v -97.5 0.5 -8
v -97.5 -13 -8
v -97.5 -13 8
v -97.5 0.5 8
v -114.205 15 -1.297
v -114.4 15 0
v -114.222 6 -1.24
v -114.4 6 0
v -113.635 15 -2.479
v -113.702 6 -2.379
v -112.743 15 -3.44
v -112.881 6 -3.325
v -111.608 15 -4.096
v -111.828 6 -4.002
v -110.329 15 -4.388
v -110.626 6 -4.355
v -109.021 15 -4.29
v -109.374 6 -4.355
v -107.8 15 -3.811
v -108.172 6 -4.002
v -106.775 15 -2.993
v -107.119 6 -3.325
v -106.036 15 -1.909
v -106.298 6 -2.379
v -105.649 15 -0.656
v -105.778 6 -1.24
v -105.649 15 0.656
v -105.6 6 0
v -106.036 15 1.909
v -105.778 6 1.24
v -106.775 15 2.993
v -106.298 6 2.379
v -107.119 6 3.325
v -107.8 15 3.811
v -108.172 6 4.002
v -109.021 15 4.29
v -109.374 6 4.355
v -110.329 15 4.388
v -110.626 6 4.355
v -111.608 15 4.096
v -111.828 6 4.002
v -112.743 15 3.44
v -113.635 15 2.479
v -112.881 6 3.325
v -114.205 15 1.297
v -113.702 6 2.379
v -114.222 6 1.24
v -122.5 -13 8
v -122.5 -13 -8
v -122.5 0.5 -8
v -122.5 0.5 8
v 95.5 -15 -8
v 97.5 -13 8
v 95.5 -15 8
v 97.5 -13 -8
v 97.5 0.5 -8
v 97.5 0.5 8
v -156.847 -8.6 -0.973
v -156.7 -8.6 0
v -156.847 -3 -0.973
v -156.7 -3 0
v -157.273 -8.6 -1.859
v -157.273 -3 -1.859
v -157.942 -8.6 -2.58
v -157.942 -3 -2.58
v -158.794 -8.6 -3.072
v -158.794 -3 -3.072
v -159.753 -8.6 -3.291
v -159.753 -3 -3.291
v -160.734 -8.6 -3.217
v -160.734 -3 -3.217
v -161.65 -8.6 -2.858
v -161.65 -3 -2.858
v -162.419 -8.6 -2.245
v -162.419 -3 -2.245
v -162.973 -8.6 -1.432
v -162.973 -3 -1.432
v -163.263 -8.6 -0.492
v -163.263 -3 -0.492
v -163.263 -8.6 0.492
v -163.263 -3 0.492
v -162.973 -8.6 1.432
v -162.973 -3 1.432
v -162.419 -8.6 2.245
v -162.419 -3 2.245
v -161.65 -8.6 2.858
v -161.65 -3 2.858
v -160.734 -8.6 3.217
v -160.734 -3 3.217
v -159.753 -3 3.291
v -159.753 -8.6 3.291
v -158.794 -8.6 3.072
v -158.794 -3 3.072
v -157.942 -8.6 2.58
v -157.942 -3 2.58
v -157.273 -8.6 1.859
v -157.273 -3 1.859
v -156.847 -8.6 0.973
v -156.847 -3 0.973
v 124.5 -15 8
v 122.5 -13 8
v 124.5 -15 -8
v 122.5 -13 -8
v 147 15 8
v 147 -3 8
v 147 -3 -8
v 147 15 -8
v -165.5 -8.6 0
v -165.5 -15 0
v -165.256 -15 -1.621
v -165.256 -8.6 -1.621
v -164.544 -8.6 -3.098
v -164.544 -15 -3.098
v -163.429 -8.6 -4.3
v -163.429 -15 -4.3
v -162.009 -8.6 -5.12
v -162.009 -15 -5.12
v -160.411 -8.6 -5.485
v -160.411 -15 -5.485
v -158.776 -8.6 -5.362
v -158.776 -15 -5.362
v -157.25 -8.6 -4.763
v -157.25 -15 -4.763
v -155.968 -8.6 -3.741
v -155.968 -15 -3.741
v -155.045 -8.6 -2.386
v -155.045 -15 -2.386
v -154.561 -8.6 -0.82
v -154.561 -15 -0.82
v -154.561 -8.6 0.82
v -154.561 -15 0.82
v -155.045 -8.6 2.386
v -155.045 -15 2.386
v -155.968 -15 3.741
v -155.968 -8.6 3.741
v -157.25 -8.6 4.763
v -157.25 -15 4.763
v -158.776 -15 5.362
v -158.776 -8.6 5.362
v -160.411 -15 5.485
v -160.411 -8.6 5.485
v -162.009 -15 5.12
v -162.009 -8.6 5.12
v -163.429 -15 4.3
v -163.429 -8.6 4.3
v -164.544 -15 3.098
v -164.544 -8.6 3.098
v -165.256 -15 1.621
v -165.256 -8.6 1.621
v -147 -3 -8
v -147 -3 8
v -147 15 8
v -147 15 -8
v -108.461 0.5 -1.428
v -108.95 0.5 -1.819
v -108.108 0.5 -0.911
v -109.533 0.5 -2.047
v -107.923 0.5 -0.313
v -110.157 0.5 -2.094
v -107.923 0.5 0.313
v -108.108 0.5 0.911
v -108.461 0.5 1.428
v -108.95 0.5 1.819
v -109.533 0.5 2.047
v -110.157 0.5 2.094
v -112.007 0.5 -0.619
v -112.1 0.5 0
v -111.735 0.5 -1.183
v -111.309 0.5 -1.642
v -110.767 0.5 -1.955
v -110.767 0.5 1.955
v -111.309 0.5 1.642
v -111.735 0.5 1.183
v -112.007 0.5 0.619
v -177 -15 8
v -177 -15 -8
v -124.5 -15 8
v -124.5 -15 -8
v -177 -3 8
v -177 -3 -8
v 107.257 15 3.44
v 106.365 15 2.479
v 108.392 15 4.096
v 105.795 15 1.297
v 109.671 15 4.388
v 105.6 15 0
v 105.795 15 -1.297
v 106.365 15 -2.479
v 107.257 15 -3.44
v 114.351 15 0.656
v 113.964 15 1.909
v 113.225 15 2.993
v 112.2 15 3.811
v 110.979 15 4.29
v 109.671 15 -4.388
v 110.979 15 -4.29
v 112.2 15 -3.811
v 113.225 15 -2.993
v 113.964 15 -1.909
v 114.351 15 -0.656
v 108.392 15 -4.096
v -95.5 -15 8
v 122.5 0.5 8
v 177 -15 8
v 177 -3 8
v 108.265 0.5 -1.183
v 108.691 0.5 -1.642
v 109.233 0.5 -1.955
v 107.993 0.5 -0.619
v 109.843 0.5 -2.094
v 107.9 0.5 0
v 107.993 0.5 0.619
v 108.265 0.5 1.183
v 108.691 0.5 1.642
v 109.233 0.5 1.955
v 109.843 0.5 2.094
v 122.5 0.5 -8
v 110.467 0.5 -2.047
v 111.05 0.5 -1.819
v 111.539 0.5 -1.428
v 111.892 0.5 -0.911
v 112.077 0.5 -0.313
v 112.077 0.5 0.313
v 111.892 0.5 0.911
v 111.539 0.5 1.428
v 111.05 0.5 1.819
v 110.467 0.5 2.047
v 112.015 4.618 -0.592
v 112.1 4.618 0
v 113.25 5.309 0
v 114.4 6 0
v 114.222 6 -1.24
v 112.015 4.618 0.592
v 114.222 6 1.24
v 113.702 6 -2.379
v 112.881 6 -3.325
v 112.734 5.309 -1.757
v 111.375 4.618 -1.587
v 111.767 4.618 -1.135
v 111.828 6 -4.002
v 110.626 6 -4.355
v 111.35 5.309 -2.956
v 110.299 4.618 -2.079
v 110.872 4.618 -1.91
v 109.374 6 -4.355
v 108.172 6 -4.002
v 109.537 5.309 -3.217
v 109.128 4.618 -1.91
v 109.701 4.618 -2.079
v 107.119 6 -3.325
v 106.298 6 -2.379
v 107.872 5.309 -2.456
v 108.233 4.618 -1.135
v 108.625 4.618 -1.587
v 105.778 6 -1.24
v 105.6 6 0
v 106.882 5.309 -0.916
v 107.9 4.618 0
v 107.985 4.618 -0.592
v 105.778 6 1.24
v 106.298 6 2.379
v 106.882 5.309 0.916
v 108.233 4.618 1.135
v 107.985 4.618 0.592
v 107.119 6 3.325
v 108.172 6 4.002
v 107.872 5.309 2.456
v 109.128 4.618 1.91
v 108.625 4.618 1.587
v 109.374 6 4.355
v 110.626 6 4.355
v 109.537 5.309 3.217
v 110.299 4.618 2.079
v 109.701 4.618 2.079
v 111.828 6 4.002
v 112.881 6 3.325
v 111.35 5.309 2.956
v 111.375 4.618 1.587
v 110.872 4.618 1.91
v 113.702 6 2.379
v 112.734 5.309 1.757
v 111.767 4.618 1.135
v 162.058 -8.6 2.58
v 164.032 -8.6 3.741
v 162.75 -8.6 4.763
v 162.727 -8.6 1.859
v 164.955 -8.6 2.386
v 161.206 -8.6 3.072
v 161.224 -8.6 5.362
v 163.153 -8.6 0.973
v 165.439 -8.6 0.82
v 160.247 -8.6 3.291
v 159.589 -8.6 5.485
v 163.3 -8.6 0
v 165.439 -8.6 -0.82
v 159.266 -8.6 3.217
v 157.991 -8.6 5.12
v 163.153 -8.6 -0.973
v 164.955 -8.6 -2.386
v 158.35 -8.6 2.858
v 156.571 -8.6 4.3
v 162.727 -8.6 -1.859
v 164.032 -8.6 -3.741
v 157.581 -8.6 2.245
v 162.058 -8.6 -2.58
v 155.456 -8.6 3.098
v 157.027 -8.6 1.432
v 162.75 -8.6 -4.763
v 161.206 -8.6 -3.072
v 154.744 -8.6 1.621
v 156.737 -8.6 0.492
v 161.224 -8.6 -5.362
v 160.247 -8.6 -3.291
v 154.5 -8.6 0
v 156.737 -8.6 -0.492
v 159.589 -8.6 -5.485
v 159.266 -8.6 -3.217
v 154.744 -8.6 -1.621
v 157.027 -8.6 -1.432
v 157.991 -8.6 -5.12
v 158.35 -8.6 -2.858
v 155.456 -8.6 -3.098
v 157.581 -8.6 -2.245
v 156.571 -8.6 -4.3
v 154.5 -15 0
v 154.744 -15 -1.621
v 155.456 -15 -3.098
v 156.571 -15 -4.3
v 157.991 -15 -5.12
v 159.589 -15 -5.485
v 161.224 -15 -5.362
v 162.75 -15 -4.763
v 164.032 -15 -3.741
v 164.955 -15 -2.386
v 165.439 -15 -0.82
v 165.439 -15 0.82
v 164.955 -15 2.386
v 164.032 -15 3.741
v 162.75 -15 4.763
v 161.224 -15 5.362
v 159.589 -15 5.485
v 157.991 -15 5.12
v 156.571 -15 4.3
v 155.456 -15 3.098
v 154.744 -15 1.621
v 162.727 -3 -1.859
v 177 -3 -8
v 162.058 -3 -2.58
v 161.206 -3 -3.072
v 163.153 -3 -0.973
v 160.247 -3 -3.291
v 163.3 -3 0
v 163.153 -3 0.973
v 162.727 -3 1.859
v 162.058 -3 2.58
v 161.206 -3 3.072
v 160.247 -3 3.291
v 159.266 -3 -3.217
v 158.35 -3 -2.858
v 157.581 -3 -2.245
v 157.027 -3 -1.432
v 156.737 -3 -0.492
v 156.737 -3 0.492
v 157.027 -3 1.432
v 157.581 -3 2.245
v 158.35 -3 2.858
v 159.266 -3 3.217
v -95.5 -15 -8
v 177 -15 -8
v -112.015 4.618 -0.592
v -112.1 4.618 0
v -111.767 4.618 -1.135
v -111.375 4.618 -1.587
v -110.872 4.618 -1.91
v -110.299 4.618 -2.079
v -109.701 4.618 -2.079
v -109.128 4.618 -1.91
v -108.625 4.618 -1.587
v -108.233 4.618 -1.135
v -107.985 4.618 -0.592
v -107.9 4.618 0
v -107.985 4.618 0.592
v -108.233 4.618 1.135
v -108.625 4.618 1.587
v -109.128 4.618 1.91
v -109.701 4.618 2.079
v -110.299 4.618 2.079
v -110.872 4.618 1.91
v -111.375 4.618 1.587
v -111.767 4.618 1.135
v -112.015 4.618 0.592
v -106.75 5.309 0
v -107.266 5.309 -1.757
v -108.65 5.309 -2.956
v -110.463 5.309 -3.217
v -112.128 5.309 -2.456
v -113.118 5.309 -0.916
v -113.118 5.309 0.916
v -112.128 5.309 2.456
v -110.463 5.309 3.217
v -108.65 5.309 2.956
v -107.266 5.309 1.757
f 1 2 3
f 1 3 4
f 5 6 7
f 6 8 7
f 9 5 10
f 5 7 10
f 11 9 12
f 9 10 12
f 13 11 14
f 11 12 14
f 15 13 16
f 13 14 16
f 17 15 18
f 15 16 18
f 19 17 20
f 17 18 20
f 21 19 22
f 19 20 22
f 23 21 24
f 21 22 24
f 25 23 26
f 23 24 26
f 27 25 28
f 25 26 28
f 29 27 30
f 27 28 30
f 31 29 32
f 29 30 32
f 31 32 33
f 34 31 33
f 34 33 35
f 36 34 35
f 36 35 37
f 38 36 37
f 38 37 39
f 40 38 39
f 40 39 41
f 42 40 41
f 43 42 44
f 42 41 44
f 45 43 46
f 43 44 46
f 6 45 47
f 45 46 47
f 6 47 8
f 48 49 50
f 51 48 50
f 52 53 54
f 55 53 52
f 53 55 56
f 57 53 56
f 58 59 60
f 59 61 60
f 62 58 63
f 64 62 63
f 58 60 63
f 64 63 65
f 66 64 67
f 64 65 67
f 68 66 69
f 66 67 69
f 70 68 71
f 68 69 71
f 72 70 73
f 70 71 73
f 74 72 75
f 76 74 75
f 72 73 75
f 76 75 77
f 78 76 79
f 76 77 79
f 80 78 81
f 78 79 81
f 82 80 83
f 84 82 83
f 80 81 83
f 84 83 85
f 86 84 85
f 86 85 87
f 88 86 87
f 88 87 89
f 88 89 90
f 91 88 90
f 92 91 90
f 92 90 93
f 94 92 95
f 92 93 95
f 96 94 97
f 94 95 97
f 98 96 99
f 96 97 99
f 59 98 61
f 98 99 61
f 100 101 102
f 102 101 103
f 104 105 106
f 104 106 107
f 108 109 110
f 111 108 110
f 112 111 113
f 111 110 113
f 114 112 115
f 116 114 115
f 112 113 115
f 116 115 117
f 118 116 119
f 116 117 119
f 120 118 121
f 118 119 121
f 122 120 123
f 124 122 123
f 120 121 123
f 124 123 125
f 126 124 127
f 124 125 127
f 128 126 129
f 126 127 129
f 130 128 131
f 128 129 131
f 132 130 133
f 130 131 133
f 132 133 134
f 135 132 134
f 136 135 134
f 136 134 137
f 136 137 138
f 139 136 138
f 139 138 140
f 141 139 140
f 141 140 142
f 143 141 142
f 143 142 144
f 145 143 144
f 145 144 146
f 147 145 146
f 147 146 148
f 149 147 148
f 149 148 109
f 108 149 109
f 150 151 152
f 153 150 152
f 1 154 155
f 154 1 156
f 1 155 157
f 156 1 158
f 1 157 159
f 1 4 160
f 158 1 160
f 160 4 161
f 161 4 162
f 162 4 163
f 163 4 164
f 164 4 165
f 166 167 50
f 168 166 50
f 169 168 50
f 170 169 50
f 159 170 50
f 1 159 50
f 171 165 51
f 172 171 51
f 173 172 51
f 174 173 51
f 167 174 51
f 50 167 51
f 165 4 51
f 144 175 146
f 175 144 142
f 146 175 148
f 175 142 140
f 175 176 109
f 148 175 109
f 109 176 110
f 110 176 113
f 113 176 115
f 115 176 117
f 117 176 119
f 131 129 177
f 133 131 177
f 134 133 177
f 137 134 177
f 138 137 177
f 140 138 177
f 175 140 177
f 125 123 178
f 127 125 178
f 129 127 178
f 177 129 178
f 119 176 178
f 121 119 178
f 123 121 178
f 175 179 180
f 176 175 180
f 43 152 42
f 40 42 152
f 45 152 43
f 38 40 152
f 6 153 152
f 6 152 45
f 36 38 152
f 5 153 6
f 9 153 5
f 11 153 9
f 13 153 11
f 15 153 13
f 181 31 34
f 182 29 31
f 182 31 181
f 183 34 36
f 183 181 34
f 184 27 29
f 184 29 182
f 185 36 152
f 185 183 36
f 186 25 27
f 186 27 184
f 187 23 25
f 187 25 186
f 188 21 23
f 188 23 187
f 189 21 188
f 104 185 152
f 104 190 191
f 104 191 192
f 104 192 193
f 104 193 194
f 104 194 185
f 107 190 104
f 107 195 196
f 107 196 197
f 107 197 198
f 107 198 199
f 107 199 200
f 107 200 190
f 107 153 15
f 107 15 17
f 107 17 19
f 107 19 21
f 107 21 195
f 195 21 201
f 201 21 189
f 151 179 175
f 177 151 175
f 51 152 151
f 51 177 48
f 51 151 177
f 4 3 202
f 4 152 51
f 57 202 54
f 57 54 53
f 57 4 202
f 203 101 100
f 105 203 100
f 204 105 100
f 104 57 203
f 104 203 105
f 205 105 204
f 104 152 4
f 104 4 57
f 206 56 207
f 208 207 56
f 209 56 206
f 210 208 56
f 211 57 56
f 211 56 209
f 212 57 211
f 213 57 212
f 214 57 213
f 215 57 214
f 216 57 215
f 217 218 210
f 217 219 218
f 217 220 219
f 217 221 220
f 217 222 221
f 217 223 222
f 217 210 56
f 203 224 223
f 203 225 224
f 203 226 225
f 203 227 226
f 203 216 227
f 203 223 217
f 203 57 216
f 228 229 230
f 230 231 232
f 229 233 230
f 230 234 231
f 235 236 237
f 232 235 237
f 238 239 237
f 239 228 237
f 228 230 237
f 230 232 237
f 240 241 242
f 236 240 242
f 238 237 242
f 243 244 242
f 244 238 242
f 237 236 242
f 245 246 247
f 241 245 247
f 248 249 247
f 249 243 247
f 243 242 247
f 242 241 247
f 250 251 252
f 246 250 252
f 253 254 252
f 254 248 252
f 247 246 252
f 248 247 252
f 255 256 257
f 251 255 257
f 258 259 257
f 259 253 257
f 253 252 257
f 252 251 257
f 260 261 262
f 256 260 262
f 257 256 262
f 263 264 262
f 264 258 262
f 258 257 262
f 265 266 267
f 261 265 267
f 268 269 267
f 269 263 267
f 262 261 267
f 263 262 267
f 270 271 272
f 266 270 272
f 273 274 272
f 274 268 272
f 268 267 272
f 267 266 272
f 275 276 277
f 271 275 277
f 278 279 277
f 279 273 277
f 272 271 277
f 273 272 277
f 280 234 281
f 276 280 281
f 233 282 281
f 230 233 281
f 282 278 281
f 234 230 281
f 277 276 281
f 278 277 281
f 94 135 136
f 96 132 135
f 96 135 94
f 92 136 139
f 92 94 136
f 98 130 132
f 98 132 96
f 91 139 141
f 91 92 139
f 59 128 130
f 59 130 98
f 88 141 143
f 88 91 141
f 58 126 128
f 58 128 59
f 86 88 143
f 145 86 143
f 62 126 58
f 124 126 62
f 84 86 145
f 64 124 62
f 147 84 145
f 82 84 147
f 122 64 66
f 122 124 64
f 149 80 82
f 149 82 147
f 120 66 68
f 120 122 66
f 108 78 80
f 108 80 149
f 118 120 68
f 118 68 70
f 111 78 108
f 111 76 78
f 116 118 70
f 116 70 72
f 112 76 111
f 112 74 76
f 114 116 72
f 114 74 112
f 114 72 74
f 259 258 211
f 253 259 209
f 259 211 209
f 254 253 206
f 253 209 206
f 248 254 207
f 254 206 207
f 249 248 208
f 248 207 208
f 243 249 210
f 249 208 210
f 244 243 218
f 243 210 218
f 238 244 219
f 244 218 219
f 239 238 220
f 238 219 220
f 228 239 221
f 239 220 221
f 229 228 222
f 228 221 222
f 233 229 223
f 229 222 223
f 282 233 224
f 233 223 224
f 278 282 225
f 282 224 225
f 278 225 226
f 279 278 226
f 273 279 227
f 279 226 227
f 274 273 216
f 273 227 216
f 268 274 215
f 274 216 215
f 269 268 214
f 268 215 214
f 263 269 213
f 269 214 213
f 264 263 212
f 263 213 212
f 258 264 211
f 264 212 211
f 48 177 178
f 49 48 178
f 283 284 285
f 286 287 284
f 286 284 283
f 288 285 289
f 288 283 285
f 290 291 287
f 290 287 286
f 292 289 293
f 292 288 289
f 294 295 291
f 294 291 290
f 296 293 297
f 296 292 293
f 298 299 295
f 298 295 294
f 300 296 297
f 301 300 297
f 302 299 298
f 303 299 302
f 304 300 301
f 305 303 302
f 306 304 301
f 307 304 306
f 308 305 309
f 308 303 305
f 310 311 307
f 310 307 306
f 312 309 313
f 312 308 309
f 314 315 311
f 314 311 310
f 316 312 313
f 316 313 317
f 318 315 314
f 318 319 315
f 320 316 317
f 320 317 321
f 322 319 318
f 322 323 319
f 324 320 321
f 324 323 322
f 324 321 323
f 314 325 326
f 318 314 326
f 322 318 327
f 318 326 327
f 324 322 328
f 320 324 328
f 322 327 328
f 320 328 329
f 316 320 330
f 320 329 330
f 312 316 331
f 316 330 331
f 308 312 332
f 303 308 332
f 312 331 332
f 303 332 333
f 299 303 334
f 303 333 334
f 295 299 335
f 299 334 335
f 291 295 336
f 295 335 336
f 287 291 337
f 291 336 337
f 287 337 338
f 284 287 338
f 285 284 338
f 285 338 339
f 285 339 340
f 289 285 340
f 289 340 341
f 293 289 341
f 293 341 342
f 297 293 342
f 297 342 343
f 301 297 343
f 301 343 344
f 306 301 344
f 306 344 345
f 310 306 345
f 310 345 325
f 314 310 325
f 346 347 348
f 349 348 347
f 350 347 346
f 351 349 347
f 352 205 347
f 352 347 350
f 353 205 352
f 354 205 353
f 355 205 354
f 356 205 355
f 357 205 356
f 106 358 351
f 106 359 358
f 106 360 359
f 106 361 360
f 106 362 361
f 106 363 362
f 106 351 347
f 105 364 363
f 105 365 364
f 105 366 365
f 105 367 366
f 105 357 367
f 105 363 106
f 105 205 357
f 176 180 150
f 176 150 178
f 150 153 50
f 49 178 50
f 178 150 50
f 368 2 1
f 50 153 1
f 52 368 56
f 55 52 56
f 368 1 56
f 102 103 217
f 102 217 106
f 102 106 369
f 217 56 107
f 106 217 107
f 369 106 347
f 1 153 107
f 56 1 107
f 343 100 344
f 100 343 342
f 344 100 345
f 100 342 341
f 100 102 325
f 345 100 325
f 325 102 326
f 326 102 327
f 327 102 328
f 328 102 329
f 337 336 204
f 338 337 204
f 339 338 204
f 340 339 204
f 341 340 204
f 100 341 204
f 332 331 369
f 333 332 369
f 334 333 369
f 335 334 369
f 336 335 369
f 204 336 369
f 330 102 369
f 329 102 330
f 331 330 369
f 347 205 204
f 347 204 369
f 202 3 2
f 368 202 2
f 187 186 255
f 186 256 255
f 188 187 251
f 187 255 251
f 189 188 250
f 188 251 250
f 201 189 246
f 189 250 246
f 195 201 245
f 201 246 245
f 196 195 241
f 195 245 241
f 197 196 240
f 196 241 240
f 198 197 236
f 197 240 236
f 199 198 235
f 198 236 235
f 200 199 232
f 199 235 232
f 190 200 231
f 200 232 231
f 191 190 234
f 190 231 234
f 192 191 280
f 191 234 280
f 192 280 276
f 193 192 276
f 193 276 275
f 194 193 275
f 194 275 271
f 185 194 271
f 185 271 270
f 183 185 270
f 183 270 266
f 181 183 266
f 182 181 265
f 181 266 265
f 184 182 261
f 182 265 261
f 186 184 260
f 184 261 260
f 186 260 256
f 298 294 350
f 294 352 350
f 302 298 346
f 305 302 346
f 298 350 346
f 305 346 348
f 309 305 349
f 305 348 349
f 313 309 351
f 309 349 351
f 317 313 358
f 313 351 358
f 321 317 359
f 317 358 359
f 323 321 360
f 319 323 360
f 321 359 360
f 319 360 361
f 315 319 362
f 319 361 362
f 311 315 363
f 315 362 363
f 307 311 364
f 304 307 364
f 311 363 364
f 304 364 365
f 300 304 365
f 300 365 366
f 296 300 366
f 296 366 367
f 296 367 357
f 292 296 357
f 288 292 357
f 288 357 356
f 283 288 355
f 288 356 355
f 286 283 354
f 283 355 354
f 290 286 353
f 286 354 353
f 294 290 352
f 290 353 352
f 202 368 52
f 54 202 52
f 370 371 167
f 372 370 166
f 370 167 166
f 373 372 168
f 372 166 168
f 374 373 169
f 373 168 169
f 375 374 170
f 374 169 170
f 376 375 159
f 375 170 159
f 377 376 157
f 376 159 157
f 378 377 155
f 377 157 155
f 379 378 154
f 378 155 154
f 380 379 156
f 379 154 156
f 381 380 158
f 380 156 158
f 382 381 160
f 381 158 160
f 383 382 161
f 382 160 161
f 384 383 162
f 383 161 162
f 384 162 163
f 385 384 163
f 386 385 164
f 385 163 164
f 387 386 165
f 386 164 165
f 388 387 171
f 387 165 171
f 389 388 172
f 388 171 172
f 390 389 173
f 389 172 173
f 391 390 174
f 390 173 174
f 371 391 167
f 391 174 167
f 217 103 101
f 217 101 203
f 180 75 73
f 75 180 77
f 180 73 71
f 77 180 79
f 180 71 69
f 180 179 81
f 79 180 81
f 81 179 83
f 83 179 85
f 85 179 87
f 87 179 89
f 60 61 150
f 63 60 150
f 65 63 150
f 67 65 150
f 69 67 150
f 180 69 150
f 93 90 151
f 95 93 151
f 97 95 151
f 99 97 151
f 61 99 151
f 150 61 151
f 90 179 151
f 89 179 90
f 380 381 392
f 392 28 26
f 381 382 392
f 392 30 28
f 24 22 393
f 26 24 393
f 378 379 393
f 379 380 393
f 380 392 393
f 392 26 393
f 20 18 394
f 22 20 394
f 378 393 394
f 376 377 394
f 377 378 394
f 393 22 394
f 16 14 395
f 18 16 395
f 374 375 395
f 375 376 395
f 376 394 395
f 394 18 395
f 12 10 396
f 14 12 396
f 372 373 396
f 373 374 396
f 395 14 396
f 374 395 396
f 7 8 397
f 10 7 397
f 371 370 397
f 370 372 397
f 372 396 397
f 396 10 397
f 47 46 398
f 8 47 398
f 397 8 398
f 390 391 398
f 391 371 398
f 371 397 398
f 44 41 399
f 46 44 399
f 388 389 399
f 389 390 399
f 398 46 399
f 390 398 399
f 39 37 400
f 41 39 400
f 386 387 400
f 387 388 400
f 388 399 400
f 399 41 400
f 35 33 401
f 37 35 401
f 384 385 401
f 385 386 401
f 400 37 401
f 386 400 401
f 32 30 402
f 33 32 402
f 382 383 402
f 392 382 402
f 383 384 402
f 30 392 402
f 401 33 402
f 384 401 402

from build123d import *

# Parameters (mm, degrees)
SKETCH1_W                                           = 354
SKETCH1_H                                           = 16
BOSS_EXTRUDE1_DEPTH                                 = 15
M5_TAPPED_HOLE1_D                                   = 4.2
SKETCH7_W                                           = 25
SKETCH7_H                                           = 27.047818694
CUT_EXTRUDE2_DEPTH                                  = 179.353581405
CHAMFER1_SIZE                                       = 2
CHAMFER1_OF_MIRROR1_SIZE                            = 2
G1_8_TAPPED_HOLE1_D                                 = 8.8
G1_8_TAPPED_HOLE1_DEPTH                             = 9
G1_8_TAPPED_HOLE1_TIP                               = 2.643786724
SKETCH10_W                                          = 30
SKETCH10_H                                          = 18
CUT_EXTRUDE3_DEPTH                                  = 179.353581405
CBORE_FOR_M6_HEX_SOCKET_HEAD_CAP_SCREW1_D           = 6.6
CBORE_FOR_M6_HEX_SOCKET_HEAD_CAP_SCREW1_CBORE_D     = 11
CBORE_FOR_M6_HEX_SOCKET_HEAD_CAP_SCREW1_CBORE_DEPTH = 6.4


with BuildPart() as part:
    # Sketch1 → Boss-Extrude1 (new, symmetric)
    with BuildSketch(Plane(origin=(0, 0, 0), x_dir=(1, 0, 0), z_dir=(0, 1, 0))):
        Rectangle(SKETCH1_W, SKETCH1_H)
    extrude(amount=BOSS_EXTRUDE1_DEPTH, both=True)

    # M5 Tapped Hole1 (through all)
    with Locations(Plane(origin=(0, 15, 0), x_dir=(1, 0, 0), z_dir=(0, 1, 0))):
        with Locations((-110, 0), (110, 0)):
            Hole(M5_TAPPED_HOLE1_D / 2)

    # Sketch7 → Cut-Extrude2 (cut, through all)
    with BuildSketch(Plane.XY.offset(8)):
        with Locations((110, -13.023909347)):
            Rectangle(SKETCH7_W, SKETCH7_H)
    cut_extrude2 = extrude(amount=-CUT_EXTRUDE2_DEPTH, mode=Mode.SUBTRACT)

    # Chamfer1
    chamfer1_edges = [part.edges().sort_by_distance(p)[0] for p in [
        (122.5, -15, 0),
        (97.5, -15, 0),
    ]]
    chamfer(chamfer1_edges, length=CHAMFER1_SIZE)

    # Mirror1: Cut-Extrude2 across plane
    add(cut_extrude2.mirror(Plane(origin=(0, 0, 0), x_dir=(0, 0, 1), z_dir=(1, 0, 0))), mode=Mode.SUBTRACT)

    # Chamfer1 of Mirror1
    chamfer1_of_mirror1_edges = [part.edges().sort_by_distance(p)[0] for p in [
        (-122.5, -15, 0),
        (-97.5, -15, 0),
    ]]
    chamfer(chamfer1_of_mirror1_edges, length=CHAMFER1_OF_MIRROR1_SIZE)

    # G1/8 Tapped Hole1
    with Locations(Plane(origin=(0, 15, 0), x_dir=(1, 0, 0), z_dir=(0, 1, 0))):
        with Locations((-110, 0), (110, 0)):
            Hole(G1_8_TAPPED_HOLE1_D / 2, depth=G1_8_TAPPED_HOLE1_DEPTH)
            with Locations((0, 0, -(G1_8_TAPPED_HOLE1_DEPTH + G1_8_TAPPED_HOLE1_TIP / 2))):  # 118° drill point
                Cone(0, G1_8_TAPPED_HOLE1_D / 2, G1_8_TAPPED_HOLE1_TIP, mode=Mode.SUBTRACT)

    # Sketch10 → Cut-Extrude3 (cut, through all)
    with BuildSketch(Plane.XY.offset(8)):
        with Locations((-162, 6)):
            Rectangle(SKETCH10_W, SKETCH10_H)
    cut_extrude3 = extrude(amount=-CUT_EXTRUDE3_DEPTH, mode=Mode.SUBTRACT)

    # Mirror2: Cut-Extrude3 across plane
    add(cut_extrude3.mirror(Plane(origin=(0, 0, 0), x_dir=(0, 0, 1), z_dir=(1, 0, 0))), mode=Mode.SUBTRACT)

    # CBORE for M6 Hex Socket Head Cap Screw1 (through all)
    with Locations(Plane(origin=(0, -15, 0), x_dir=(-1, 0, 0), z_dir=(0, -1, 0))):
        with Locations((-160, 0), (160, 0)):
            CounterBoreHole(CBORE_FOR_M6_HEX_SOCKET_HEAD_CAP_SCREW1_D / 2, CBORE_FOR_M6_HEX_SOCKET_HEAD_CAP_SCREW1_CBORE_D / 2, CBORE_FOR_M6_HEX_SOCKET_HEAD_CAP_SCREW1_CBORE_DEPTH)


solid = part.part
